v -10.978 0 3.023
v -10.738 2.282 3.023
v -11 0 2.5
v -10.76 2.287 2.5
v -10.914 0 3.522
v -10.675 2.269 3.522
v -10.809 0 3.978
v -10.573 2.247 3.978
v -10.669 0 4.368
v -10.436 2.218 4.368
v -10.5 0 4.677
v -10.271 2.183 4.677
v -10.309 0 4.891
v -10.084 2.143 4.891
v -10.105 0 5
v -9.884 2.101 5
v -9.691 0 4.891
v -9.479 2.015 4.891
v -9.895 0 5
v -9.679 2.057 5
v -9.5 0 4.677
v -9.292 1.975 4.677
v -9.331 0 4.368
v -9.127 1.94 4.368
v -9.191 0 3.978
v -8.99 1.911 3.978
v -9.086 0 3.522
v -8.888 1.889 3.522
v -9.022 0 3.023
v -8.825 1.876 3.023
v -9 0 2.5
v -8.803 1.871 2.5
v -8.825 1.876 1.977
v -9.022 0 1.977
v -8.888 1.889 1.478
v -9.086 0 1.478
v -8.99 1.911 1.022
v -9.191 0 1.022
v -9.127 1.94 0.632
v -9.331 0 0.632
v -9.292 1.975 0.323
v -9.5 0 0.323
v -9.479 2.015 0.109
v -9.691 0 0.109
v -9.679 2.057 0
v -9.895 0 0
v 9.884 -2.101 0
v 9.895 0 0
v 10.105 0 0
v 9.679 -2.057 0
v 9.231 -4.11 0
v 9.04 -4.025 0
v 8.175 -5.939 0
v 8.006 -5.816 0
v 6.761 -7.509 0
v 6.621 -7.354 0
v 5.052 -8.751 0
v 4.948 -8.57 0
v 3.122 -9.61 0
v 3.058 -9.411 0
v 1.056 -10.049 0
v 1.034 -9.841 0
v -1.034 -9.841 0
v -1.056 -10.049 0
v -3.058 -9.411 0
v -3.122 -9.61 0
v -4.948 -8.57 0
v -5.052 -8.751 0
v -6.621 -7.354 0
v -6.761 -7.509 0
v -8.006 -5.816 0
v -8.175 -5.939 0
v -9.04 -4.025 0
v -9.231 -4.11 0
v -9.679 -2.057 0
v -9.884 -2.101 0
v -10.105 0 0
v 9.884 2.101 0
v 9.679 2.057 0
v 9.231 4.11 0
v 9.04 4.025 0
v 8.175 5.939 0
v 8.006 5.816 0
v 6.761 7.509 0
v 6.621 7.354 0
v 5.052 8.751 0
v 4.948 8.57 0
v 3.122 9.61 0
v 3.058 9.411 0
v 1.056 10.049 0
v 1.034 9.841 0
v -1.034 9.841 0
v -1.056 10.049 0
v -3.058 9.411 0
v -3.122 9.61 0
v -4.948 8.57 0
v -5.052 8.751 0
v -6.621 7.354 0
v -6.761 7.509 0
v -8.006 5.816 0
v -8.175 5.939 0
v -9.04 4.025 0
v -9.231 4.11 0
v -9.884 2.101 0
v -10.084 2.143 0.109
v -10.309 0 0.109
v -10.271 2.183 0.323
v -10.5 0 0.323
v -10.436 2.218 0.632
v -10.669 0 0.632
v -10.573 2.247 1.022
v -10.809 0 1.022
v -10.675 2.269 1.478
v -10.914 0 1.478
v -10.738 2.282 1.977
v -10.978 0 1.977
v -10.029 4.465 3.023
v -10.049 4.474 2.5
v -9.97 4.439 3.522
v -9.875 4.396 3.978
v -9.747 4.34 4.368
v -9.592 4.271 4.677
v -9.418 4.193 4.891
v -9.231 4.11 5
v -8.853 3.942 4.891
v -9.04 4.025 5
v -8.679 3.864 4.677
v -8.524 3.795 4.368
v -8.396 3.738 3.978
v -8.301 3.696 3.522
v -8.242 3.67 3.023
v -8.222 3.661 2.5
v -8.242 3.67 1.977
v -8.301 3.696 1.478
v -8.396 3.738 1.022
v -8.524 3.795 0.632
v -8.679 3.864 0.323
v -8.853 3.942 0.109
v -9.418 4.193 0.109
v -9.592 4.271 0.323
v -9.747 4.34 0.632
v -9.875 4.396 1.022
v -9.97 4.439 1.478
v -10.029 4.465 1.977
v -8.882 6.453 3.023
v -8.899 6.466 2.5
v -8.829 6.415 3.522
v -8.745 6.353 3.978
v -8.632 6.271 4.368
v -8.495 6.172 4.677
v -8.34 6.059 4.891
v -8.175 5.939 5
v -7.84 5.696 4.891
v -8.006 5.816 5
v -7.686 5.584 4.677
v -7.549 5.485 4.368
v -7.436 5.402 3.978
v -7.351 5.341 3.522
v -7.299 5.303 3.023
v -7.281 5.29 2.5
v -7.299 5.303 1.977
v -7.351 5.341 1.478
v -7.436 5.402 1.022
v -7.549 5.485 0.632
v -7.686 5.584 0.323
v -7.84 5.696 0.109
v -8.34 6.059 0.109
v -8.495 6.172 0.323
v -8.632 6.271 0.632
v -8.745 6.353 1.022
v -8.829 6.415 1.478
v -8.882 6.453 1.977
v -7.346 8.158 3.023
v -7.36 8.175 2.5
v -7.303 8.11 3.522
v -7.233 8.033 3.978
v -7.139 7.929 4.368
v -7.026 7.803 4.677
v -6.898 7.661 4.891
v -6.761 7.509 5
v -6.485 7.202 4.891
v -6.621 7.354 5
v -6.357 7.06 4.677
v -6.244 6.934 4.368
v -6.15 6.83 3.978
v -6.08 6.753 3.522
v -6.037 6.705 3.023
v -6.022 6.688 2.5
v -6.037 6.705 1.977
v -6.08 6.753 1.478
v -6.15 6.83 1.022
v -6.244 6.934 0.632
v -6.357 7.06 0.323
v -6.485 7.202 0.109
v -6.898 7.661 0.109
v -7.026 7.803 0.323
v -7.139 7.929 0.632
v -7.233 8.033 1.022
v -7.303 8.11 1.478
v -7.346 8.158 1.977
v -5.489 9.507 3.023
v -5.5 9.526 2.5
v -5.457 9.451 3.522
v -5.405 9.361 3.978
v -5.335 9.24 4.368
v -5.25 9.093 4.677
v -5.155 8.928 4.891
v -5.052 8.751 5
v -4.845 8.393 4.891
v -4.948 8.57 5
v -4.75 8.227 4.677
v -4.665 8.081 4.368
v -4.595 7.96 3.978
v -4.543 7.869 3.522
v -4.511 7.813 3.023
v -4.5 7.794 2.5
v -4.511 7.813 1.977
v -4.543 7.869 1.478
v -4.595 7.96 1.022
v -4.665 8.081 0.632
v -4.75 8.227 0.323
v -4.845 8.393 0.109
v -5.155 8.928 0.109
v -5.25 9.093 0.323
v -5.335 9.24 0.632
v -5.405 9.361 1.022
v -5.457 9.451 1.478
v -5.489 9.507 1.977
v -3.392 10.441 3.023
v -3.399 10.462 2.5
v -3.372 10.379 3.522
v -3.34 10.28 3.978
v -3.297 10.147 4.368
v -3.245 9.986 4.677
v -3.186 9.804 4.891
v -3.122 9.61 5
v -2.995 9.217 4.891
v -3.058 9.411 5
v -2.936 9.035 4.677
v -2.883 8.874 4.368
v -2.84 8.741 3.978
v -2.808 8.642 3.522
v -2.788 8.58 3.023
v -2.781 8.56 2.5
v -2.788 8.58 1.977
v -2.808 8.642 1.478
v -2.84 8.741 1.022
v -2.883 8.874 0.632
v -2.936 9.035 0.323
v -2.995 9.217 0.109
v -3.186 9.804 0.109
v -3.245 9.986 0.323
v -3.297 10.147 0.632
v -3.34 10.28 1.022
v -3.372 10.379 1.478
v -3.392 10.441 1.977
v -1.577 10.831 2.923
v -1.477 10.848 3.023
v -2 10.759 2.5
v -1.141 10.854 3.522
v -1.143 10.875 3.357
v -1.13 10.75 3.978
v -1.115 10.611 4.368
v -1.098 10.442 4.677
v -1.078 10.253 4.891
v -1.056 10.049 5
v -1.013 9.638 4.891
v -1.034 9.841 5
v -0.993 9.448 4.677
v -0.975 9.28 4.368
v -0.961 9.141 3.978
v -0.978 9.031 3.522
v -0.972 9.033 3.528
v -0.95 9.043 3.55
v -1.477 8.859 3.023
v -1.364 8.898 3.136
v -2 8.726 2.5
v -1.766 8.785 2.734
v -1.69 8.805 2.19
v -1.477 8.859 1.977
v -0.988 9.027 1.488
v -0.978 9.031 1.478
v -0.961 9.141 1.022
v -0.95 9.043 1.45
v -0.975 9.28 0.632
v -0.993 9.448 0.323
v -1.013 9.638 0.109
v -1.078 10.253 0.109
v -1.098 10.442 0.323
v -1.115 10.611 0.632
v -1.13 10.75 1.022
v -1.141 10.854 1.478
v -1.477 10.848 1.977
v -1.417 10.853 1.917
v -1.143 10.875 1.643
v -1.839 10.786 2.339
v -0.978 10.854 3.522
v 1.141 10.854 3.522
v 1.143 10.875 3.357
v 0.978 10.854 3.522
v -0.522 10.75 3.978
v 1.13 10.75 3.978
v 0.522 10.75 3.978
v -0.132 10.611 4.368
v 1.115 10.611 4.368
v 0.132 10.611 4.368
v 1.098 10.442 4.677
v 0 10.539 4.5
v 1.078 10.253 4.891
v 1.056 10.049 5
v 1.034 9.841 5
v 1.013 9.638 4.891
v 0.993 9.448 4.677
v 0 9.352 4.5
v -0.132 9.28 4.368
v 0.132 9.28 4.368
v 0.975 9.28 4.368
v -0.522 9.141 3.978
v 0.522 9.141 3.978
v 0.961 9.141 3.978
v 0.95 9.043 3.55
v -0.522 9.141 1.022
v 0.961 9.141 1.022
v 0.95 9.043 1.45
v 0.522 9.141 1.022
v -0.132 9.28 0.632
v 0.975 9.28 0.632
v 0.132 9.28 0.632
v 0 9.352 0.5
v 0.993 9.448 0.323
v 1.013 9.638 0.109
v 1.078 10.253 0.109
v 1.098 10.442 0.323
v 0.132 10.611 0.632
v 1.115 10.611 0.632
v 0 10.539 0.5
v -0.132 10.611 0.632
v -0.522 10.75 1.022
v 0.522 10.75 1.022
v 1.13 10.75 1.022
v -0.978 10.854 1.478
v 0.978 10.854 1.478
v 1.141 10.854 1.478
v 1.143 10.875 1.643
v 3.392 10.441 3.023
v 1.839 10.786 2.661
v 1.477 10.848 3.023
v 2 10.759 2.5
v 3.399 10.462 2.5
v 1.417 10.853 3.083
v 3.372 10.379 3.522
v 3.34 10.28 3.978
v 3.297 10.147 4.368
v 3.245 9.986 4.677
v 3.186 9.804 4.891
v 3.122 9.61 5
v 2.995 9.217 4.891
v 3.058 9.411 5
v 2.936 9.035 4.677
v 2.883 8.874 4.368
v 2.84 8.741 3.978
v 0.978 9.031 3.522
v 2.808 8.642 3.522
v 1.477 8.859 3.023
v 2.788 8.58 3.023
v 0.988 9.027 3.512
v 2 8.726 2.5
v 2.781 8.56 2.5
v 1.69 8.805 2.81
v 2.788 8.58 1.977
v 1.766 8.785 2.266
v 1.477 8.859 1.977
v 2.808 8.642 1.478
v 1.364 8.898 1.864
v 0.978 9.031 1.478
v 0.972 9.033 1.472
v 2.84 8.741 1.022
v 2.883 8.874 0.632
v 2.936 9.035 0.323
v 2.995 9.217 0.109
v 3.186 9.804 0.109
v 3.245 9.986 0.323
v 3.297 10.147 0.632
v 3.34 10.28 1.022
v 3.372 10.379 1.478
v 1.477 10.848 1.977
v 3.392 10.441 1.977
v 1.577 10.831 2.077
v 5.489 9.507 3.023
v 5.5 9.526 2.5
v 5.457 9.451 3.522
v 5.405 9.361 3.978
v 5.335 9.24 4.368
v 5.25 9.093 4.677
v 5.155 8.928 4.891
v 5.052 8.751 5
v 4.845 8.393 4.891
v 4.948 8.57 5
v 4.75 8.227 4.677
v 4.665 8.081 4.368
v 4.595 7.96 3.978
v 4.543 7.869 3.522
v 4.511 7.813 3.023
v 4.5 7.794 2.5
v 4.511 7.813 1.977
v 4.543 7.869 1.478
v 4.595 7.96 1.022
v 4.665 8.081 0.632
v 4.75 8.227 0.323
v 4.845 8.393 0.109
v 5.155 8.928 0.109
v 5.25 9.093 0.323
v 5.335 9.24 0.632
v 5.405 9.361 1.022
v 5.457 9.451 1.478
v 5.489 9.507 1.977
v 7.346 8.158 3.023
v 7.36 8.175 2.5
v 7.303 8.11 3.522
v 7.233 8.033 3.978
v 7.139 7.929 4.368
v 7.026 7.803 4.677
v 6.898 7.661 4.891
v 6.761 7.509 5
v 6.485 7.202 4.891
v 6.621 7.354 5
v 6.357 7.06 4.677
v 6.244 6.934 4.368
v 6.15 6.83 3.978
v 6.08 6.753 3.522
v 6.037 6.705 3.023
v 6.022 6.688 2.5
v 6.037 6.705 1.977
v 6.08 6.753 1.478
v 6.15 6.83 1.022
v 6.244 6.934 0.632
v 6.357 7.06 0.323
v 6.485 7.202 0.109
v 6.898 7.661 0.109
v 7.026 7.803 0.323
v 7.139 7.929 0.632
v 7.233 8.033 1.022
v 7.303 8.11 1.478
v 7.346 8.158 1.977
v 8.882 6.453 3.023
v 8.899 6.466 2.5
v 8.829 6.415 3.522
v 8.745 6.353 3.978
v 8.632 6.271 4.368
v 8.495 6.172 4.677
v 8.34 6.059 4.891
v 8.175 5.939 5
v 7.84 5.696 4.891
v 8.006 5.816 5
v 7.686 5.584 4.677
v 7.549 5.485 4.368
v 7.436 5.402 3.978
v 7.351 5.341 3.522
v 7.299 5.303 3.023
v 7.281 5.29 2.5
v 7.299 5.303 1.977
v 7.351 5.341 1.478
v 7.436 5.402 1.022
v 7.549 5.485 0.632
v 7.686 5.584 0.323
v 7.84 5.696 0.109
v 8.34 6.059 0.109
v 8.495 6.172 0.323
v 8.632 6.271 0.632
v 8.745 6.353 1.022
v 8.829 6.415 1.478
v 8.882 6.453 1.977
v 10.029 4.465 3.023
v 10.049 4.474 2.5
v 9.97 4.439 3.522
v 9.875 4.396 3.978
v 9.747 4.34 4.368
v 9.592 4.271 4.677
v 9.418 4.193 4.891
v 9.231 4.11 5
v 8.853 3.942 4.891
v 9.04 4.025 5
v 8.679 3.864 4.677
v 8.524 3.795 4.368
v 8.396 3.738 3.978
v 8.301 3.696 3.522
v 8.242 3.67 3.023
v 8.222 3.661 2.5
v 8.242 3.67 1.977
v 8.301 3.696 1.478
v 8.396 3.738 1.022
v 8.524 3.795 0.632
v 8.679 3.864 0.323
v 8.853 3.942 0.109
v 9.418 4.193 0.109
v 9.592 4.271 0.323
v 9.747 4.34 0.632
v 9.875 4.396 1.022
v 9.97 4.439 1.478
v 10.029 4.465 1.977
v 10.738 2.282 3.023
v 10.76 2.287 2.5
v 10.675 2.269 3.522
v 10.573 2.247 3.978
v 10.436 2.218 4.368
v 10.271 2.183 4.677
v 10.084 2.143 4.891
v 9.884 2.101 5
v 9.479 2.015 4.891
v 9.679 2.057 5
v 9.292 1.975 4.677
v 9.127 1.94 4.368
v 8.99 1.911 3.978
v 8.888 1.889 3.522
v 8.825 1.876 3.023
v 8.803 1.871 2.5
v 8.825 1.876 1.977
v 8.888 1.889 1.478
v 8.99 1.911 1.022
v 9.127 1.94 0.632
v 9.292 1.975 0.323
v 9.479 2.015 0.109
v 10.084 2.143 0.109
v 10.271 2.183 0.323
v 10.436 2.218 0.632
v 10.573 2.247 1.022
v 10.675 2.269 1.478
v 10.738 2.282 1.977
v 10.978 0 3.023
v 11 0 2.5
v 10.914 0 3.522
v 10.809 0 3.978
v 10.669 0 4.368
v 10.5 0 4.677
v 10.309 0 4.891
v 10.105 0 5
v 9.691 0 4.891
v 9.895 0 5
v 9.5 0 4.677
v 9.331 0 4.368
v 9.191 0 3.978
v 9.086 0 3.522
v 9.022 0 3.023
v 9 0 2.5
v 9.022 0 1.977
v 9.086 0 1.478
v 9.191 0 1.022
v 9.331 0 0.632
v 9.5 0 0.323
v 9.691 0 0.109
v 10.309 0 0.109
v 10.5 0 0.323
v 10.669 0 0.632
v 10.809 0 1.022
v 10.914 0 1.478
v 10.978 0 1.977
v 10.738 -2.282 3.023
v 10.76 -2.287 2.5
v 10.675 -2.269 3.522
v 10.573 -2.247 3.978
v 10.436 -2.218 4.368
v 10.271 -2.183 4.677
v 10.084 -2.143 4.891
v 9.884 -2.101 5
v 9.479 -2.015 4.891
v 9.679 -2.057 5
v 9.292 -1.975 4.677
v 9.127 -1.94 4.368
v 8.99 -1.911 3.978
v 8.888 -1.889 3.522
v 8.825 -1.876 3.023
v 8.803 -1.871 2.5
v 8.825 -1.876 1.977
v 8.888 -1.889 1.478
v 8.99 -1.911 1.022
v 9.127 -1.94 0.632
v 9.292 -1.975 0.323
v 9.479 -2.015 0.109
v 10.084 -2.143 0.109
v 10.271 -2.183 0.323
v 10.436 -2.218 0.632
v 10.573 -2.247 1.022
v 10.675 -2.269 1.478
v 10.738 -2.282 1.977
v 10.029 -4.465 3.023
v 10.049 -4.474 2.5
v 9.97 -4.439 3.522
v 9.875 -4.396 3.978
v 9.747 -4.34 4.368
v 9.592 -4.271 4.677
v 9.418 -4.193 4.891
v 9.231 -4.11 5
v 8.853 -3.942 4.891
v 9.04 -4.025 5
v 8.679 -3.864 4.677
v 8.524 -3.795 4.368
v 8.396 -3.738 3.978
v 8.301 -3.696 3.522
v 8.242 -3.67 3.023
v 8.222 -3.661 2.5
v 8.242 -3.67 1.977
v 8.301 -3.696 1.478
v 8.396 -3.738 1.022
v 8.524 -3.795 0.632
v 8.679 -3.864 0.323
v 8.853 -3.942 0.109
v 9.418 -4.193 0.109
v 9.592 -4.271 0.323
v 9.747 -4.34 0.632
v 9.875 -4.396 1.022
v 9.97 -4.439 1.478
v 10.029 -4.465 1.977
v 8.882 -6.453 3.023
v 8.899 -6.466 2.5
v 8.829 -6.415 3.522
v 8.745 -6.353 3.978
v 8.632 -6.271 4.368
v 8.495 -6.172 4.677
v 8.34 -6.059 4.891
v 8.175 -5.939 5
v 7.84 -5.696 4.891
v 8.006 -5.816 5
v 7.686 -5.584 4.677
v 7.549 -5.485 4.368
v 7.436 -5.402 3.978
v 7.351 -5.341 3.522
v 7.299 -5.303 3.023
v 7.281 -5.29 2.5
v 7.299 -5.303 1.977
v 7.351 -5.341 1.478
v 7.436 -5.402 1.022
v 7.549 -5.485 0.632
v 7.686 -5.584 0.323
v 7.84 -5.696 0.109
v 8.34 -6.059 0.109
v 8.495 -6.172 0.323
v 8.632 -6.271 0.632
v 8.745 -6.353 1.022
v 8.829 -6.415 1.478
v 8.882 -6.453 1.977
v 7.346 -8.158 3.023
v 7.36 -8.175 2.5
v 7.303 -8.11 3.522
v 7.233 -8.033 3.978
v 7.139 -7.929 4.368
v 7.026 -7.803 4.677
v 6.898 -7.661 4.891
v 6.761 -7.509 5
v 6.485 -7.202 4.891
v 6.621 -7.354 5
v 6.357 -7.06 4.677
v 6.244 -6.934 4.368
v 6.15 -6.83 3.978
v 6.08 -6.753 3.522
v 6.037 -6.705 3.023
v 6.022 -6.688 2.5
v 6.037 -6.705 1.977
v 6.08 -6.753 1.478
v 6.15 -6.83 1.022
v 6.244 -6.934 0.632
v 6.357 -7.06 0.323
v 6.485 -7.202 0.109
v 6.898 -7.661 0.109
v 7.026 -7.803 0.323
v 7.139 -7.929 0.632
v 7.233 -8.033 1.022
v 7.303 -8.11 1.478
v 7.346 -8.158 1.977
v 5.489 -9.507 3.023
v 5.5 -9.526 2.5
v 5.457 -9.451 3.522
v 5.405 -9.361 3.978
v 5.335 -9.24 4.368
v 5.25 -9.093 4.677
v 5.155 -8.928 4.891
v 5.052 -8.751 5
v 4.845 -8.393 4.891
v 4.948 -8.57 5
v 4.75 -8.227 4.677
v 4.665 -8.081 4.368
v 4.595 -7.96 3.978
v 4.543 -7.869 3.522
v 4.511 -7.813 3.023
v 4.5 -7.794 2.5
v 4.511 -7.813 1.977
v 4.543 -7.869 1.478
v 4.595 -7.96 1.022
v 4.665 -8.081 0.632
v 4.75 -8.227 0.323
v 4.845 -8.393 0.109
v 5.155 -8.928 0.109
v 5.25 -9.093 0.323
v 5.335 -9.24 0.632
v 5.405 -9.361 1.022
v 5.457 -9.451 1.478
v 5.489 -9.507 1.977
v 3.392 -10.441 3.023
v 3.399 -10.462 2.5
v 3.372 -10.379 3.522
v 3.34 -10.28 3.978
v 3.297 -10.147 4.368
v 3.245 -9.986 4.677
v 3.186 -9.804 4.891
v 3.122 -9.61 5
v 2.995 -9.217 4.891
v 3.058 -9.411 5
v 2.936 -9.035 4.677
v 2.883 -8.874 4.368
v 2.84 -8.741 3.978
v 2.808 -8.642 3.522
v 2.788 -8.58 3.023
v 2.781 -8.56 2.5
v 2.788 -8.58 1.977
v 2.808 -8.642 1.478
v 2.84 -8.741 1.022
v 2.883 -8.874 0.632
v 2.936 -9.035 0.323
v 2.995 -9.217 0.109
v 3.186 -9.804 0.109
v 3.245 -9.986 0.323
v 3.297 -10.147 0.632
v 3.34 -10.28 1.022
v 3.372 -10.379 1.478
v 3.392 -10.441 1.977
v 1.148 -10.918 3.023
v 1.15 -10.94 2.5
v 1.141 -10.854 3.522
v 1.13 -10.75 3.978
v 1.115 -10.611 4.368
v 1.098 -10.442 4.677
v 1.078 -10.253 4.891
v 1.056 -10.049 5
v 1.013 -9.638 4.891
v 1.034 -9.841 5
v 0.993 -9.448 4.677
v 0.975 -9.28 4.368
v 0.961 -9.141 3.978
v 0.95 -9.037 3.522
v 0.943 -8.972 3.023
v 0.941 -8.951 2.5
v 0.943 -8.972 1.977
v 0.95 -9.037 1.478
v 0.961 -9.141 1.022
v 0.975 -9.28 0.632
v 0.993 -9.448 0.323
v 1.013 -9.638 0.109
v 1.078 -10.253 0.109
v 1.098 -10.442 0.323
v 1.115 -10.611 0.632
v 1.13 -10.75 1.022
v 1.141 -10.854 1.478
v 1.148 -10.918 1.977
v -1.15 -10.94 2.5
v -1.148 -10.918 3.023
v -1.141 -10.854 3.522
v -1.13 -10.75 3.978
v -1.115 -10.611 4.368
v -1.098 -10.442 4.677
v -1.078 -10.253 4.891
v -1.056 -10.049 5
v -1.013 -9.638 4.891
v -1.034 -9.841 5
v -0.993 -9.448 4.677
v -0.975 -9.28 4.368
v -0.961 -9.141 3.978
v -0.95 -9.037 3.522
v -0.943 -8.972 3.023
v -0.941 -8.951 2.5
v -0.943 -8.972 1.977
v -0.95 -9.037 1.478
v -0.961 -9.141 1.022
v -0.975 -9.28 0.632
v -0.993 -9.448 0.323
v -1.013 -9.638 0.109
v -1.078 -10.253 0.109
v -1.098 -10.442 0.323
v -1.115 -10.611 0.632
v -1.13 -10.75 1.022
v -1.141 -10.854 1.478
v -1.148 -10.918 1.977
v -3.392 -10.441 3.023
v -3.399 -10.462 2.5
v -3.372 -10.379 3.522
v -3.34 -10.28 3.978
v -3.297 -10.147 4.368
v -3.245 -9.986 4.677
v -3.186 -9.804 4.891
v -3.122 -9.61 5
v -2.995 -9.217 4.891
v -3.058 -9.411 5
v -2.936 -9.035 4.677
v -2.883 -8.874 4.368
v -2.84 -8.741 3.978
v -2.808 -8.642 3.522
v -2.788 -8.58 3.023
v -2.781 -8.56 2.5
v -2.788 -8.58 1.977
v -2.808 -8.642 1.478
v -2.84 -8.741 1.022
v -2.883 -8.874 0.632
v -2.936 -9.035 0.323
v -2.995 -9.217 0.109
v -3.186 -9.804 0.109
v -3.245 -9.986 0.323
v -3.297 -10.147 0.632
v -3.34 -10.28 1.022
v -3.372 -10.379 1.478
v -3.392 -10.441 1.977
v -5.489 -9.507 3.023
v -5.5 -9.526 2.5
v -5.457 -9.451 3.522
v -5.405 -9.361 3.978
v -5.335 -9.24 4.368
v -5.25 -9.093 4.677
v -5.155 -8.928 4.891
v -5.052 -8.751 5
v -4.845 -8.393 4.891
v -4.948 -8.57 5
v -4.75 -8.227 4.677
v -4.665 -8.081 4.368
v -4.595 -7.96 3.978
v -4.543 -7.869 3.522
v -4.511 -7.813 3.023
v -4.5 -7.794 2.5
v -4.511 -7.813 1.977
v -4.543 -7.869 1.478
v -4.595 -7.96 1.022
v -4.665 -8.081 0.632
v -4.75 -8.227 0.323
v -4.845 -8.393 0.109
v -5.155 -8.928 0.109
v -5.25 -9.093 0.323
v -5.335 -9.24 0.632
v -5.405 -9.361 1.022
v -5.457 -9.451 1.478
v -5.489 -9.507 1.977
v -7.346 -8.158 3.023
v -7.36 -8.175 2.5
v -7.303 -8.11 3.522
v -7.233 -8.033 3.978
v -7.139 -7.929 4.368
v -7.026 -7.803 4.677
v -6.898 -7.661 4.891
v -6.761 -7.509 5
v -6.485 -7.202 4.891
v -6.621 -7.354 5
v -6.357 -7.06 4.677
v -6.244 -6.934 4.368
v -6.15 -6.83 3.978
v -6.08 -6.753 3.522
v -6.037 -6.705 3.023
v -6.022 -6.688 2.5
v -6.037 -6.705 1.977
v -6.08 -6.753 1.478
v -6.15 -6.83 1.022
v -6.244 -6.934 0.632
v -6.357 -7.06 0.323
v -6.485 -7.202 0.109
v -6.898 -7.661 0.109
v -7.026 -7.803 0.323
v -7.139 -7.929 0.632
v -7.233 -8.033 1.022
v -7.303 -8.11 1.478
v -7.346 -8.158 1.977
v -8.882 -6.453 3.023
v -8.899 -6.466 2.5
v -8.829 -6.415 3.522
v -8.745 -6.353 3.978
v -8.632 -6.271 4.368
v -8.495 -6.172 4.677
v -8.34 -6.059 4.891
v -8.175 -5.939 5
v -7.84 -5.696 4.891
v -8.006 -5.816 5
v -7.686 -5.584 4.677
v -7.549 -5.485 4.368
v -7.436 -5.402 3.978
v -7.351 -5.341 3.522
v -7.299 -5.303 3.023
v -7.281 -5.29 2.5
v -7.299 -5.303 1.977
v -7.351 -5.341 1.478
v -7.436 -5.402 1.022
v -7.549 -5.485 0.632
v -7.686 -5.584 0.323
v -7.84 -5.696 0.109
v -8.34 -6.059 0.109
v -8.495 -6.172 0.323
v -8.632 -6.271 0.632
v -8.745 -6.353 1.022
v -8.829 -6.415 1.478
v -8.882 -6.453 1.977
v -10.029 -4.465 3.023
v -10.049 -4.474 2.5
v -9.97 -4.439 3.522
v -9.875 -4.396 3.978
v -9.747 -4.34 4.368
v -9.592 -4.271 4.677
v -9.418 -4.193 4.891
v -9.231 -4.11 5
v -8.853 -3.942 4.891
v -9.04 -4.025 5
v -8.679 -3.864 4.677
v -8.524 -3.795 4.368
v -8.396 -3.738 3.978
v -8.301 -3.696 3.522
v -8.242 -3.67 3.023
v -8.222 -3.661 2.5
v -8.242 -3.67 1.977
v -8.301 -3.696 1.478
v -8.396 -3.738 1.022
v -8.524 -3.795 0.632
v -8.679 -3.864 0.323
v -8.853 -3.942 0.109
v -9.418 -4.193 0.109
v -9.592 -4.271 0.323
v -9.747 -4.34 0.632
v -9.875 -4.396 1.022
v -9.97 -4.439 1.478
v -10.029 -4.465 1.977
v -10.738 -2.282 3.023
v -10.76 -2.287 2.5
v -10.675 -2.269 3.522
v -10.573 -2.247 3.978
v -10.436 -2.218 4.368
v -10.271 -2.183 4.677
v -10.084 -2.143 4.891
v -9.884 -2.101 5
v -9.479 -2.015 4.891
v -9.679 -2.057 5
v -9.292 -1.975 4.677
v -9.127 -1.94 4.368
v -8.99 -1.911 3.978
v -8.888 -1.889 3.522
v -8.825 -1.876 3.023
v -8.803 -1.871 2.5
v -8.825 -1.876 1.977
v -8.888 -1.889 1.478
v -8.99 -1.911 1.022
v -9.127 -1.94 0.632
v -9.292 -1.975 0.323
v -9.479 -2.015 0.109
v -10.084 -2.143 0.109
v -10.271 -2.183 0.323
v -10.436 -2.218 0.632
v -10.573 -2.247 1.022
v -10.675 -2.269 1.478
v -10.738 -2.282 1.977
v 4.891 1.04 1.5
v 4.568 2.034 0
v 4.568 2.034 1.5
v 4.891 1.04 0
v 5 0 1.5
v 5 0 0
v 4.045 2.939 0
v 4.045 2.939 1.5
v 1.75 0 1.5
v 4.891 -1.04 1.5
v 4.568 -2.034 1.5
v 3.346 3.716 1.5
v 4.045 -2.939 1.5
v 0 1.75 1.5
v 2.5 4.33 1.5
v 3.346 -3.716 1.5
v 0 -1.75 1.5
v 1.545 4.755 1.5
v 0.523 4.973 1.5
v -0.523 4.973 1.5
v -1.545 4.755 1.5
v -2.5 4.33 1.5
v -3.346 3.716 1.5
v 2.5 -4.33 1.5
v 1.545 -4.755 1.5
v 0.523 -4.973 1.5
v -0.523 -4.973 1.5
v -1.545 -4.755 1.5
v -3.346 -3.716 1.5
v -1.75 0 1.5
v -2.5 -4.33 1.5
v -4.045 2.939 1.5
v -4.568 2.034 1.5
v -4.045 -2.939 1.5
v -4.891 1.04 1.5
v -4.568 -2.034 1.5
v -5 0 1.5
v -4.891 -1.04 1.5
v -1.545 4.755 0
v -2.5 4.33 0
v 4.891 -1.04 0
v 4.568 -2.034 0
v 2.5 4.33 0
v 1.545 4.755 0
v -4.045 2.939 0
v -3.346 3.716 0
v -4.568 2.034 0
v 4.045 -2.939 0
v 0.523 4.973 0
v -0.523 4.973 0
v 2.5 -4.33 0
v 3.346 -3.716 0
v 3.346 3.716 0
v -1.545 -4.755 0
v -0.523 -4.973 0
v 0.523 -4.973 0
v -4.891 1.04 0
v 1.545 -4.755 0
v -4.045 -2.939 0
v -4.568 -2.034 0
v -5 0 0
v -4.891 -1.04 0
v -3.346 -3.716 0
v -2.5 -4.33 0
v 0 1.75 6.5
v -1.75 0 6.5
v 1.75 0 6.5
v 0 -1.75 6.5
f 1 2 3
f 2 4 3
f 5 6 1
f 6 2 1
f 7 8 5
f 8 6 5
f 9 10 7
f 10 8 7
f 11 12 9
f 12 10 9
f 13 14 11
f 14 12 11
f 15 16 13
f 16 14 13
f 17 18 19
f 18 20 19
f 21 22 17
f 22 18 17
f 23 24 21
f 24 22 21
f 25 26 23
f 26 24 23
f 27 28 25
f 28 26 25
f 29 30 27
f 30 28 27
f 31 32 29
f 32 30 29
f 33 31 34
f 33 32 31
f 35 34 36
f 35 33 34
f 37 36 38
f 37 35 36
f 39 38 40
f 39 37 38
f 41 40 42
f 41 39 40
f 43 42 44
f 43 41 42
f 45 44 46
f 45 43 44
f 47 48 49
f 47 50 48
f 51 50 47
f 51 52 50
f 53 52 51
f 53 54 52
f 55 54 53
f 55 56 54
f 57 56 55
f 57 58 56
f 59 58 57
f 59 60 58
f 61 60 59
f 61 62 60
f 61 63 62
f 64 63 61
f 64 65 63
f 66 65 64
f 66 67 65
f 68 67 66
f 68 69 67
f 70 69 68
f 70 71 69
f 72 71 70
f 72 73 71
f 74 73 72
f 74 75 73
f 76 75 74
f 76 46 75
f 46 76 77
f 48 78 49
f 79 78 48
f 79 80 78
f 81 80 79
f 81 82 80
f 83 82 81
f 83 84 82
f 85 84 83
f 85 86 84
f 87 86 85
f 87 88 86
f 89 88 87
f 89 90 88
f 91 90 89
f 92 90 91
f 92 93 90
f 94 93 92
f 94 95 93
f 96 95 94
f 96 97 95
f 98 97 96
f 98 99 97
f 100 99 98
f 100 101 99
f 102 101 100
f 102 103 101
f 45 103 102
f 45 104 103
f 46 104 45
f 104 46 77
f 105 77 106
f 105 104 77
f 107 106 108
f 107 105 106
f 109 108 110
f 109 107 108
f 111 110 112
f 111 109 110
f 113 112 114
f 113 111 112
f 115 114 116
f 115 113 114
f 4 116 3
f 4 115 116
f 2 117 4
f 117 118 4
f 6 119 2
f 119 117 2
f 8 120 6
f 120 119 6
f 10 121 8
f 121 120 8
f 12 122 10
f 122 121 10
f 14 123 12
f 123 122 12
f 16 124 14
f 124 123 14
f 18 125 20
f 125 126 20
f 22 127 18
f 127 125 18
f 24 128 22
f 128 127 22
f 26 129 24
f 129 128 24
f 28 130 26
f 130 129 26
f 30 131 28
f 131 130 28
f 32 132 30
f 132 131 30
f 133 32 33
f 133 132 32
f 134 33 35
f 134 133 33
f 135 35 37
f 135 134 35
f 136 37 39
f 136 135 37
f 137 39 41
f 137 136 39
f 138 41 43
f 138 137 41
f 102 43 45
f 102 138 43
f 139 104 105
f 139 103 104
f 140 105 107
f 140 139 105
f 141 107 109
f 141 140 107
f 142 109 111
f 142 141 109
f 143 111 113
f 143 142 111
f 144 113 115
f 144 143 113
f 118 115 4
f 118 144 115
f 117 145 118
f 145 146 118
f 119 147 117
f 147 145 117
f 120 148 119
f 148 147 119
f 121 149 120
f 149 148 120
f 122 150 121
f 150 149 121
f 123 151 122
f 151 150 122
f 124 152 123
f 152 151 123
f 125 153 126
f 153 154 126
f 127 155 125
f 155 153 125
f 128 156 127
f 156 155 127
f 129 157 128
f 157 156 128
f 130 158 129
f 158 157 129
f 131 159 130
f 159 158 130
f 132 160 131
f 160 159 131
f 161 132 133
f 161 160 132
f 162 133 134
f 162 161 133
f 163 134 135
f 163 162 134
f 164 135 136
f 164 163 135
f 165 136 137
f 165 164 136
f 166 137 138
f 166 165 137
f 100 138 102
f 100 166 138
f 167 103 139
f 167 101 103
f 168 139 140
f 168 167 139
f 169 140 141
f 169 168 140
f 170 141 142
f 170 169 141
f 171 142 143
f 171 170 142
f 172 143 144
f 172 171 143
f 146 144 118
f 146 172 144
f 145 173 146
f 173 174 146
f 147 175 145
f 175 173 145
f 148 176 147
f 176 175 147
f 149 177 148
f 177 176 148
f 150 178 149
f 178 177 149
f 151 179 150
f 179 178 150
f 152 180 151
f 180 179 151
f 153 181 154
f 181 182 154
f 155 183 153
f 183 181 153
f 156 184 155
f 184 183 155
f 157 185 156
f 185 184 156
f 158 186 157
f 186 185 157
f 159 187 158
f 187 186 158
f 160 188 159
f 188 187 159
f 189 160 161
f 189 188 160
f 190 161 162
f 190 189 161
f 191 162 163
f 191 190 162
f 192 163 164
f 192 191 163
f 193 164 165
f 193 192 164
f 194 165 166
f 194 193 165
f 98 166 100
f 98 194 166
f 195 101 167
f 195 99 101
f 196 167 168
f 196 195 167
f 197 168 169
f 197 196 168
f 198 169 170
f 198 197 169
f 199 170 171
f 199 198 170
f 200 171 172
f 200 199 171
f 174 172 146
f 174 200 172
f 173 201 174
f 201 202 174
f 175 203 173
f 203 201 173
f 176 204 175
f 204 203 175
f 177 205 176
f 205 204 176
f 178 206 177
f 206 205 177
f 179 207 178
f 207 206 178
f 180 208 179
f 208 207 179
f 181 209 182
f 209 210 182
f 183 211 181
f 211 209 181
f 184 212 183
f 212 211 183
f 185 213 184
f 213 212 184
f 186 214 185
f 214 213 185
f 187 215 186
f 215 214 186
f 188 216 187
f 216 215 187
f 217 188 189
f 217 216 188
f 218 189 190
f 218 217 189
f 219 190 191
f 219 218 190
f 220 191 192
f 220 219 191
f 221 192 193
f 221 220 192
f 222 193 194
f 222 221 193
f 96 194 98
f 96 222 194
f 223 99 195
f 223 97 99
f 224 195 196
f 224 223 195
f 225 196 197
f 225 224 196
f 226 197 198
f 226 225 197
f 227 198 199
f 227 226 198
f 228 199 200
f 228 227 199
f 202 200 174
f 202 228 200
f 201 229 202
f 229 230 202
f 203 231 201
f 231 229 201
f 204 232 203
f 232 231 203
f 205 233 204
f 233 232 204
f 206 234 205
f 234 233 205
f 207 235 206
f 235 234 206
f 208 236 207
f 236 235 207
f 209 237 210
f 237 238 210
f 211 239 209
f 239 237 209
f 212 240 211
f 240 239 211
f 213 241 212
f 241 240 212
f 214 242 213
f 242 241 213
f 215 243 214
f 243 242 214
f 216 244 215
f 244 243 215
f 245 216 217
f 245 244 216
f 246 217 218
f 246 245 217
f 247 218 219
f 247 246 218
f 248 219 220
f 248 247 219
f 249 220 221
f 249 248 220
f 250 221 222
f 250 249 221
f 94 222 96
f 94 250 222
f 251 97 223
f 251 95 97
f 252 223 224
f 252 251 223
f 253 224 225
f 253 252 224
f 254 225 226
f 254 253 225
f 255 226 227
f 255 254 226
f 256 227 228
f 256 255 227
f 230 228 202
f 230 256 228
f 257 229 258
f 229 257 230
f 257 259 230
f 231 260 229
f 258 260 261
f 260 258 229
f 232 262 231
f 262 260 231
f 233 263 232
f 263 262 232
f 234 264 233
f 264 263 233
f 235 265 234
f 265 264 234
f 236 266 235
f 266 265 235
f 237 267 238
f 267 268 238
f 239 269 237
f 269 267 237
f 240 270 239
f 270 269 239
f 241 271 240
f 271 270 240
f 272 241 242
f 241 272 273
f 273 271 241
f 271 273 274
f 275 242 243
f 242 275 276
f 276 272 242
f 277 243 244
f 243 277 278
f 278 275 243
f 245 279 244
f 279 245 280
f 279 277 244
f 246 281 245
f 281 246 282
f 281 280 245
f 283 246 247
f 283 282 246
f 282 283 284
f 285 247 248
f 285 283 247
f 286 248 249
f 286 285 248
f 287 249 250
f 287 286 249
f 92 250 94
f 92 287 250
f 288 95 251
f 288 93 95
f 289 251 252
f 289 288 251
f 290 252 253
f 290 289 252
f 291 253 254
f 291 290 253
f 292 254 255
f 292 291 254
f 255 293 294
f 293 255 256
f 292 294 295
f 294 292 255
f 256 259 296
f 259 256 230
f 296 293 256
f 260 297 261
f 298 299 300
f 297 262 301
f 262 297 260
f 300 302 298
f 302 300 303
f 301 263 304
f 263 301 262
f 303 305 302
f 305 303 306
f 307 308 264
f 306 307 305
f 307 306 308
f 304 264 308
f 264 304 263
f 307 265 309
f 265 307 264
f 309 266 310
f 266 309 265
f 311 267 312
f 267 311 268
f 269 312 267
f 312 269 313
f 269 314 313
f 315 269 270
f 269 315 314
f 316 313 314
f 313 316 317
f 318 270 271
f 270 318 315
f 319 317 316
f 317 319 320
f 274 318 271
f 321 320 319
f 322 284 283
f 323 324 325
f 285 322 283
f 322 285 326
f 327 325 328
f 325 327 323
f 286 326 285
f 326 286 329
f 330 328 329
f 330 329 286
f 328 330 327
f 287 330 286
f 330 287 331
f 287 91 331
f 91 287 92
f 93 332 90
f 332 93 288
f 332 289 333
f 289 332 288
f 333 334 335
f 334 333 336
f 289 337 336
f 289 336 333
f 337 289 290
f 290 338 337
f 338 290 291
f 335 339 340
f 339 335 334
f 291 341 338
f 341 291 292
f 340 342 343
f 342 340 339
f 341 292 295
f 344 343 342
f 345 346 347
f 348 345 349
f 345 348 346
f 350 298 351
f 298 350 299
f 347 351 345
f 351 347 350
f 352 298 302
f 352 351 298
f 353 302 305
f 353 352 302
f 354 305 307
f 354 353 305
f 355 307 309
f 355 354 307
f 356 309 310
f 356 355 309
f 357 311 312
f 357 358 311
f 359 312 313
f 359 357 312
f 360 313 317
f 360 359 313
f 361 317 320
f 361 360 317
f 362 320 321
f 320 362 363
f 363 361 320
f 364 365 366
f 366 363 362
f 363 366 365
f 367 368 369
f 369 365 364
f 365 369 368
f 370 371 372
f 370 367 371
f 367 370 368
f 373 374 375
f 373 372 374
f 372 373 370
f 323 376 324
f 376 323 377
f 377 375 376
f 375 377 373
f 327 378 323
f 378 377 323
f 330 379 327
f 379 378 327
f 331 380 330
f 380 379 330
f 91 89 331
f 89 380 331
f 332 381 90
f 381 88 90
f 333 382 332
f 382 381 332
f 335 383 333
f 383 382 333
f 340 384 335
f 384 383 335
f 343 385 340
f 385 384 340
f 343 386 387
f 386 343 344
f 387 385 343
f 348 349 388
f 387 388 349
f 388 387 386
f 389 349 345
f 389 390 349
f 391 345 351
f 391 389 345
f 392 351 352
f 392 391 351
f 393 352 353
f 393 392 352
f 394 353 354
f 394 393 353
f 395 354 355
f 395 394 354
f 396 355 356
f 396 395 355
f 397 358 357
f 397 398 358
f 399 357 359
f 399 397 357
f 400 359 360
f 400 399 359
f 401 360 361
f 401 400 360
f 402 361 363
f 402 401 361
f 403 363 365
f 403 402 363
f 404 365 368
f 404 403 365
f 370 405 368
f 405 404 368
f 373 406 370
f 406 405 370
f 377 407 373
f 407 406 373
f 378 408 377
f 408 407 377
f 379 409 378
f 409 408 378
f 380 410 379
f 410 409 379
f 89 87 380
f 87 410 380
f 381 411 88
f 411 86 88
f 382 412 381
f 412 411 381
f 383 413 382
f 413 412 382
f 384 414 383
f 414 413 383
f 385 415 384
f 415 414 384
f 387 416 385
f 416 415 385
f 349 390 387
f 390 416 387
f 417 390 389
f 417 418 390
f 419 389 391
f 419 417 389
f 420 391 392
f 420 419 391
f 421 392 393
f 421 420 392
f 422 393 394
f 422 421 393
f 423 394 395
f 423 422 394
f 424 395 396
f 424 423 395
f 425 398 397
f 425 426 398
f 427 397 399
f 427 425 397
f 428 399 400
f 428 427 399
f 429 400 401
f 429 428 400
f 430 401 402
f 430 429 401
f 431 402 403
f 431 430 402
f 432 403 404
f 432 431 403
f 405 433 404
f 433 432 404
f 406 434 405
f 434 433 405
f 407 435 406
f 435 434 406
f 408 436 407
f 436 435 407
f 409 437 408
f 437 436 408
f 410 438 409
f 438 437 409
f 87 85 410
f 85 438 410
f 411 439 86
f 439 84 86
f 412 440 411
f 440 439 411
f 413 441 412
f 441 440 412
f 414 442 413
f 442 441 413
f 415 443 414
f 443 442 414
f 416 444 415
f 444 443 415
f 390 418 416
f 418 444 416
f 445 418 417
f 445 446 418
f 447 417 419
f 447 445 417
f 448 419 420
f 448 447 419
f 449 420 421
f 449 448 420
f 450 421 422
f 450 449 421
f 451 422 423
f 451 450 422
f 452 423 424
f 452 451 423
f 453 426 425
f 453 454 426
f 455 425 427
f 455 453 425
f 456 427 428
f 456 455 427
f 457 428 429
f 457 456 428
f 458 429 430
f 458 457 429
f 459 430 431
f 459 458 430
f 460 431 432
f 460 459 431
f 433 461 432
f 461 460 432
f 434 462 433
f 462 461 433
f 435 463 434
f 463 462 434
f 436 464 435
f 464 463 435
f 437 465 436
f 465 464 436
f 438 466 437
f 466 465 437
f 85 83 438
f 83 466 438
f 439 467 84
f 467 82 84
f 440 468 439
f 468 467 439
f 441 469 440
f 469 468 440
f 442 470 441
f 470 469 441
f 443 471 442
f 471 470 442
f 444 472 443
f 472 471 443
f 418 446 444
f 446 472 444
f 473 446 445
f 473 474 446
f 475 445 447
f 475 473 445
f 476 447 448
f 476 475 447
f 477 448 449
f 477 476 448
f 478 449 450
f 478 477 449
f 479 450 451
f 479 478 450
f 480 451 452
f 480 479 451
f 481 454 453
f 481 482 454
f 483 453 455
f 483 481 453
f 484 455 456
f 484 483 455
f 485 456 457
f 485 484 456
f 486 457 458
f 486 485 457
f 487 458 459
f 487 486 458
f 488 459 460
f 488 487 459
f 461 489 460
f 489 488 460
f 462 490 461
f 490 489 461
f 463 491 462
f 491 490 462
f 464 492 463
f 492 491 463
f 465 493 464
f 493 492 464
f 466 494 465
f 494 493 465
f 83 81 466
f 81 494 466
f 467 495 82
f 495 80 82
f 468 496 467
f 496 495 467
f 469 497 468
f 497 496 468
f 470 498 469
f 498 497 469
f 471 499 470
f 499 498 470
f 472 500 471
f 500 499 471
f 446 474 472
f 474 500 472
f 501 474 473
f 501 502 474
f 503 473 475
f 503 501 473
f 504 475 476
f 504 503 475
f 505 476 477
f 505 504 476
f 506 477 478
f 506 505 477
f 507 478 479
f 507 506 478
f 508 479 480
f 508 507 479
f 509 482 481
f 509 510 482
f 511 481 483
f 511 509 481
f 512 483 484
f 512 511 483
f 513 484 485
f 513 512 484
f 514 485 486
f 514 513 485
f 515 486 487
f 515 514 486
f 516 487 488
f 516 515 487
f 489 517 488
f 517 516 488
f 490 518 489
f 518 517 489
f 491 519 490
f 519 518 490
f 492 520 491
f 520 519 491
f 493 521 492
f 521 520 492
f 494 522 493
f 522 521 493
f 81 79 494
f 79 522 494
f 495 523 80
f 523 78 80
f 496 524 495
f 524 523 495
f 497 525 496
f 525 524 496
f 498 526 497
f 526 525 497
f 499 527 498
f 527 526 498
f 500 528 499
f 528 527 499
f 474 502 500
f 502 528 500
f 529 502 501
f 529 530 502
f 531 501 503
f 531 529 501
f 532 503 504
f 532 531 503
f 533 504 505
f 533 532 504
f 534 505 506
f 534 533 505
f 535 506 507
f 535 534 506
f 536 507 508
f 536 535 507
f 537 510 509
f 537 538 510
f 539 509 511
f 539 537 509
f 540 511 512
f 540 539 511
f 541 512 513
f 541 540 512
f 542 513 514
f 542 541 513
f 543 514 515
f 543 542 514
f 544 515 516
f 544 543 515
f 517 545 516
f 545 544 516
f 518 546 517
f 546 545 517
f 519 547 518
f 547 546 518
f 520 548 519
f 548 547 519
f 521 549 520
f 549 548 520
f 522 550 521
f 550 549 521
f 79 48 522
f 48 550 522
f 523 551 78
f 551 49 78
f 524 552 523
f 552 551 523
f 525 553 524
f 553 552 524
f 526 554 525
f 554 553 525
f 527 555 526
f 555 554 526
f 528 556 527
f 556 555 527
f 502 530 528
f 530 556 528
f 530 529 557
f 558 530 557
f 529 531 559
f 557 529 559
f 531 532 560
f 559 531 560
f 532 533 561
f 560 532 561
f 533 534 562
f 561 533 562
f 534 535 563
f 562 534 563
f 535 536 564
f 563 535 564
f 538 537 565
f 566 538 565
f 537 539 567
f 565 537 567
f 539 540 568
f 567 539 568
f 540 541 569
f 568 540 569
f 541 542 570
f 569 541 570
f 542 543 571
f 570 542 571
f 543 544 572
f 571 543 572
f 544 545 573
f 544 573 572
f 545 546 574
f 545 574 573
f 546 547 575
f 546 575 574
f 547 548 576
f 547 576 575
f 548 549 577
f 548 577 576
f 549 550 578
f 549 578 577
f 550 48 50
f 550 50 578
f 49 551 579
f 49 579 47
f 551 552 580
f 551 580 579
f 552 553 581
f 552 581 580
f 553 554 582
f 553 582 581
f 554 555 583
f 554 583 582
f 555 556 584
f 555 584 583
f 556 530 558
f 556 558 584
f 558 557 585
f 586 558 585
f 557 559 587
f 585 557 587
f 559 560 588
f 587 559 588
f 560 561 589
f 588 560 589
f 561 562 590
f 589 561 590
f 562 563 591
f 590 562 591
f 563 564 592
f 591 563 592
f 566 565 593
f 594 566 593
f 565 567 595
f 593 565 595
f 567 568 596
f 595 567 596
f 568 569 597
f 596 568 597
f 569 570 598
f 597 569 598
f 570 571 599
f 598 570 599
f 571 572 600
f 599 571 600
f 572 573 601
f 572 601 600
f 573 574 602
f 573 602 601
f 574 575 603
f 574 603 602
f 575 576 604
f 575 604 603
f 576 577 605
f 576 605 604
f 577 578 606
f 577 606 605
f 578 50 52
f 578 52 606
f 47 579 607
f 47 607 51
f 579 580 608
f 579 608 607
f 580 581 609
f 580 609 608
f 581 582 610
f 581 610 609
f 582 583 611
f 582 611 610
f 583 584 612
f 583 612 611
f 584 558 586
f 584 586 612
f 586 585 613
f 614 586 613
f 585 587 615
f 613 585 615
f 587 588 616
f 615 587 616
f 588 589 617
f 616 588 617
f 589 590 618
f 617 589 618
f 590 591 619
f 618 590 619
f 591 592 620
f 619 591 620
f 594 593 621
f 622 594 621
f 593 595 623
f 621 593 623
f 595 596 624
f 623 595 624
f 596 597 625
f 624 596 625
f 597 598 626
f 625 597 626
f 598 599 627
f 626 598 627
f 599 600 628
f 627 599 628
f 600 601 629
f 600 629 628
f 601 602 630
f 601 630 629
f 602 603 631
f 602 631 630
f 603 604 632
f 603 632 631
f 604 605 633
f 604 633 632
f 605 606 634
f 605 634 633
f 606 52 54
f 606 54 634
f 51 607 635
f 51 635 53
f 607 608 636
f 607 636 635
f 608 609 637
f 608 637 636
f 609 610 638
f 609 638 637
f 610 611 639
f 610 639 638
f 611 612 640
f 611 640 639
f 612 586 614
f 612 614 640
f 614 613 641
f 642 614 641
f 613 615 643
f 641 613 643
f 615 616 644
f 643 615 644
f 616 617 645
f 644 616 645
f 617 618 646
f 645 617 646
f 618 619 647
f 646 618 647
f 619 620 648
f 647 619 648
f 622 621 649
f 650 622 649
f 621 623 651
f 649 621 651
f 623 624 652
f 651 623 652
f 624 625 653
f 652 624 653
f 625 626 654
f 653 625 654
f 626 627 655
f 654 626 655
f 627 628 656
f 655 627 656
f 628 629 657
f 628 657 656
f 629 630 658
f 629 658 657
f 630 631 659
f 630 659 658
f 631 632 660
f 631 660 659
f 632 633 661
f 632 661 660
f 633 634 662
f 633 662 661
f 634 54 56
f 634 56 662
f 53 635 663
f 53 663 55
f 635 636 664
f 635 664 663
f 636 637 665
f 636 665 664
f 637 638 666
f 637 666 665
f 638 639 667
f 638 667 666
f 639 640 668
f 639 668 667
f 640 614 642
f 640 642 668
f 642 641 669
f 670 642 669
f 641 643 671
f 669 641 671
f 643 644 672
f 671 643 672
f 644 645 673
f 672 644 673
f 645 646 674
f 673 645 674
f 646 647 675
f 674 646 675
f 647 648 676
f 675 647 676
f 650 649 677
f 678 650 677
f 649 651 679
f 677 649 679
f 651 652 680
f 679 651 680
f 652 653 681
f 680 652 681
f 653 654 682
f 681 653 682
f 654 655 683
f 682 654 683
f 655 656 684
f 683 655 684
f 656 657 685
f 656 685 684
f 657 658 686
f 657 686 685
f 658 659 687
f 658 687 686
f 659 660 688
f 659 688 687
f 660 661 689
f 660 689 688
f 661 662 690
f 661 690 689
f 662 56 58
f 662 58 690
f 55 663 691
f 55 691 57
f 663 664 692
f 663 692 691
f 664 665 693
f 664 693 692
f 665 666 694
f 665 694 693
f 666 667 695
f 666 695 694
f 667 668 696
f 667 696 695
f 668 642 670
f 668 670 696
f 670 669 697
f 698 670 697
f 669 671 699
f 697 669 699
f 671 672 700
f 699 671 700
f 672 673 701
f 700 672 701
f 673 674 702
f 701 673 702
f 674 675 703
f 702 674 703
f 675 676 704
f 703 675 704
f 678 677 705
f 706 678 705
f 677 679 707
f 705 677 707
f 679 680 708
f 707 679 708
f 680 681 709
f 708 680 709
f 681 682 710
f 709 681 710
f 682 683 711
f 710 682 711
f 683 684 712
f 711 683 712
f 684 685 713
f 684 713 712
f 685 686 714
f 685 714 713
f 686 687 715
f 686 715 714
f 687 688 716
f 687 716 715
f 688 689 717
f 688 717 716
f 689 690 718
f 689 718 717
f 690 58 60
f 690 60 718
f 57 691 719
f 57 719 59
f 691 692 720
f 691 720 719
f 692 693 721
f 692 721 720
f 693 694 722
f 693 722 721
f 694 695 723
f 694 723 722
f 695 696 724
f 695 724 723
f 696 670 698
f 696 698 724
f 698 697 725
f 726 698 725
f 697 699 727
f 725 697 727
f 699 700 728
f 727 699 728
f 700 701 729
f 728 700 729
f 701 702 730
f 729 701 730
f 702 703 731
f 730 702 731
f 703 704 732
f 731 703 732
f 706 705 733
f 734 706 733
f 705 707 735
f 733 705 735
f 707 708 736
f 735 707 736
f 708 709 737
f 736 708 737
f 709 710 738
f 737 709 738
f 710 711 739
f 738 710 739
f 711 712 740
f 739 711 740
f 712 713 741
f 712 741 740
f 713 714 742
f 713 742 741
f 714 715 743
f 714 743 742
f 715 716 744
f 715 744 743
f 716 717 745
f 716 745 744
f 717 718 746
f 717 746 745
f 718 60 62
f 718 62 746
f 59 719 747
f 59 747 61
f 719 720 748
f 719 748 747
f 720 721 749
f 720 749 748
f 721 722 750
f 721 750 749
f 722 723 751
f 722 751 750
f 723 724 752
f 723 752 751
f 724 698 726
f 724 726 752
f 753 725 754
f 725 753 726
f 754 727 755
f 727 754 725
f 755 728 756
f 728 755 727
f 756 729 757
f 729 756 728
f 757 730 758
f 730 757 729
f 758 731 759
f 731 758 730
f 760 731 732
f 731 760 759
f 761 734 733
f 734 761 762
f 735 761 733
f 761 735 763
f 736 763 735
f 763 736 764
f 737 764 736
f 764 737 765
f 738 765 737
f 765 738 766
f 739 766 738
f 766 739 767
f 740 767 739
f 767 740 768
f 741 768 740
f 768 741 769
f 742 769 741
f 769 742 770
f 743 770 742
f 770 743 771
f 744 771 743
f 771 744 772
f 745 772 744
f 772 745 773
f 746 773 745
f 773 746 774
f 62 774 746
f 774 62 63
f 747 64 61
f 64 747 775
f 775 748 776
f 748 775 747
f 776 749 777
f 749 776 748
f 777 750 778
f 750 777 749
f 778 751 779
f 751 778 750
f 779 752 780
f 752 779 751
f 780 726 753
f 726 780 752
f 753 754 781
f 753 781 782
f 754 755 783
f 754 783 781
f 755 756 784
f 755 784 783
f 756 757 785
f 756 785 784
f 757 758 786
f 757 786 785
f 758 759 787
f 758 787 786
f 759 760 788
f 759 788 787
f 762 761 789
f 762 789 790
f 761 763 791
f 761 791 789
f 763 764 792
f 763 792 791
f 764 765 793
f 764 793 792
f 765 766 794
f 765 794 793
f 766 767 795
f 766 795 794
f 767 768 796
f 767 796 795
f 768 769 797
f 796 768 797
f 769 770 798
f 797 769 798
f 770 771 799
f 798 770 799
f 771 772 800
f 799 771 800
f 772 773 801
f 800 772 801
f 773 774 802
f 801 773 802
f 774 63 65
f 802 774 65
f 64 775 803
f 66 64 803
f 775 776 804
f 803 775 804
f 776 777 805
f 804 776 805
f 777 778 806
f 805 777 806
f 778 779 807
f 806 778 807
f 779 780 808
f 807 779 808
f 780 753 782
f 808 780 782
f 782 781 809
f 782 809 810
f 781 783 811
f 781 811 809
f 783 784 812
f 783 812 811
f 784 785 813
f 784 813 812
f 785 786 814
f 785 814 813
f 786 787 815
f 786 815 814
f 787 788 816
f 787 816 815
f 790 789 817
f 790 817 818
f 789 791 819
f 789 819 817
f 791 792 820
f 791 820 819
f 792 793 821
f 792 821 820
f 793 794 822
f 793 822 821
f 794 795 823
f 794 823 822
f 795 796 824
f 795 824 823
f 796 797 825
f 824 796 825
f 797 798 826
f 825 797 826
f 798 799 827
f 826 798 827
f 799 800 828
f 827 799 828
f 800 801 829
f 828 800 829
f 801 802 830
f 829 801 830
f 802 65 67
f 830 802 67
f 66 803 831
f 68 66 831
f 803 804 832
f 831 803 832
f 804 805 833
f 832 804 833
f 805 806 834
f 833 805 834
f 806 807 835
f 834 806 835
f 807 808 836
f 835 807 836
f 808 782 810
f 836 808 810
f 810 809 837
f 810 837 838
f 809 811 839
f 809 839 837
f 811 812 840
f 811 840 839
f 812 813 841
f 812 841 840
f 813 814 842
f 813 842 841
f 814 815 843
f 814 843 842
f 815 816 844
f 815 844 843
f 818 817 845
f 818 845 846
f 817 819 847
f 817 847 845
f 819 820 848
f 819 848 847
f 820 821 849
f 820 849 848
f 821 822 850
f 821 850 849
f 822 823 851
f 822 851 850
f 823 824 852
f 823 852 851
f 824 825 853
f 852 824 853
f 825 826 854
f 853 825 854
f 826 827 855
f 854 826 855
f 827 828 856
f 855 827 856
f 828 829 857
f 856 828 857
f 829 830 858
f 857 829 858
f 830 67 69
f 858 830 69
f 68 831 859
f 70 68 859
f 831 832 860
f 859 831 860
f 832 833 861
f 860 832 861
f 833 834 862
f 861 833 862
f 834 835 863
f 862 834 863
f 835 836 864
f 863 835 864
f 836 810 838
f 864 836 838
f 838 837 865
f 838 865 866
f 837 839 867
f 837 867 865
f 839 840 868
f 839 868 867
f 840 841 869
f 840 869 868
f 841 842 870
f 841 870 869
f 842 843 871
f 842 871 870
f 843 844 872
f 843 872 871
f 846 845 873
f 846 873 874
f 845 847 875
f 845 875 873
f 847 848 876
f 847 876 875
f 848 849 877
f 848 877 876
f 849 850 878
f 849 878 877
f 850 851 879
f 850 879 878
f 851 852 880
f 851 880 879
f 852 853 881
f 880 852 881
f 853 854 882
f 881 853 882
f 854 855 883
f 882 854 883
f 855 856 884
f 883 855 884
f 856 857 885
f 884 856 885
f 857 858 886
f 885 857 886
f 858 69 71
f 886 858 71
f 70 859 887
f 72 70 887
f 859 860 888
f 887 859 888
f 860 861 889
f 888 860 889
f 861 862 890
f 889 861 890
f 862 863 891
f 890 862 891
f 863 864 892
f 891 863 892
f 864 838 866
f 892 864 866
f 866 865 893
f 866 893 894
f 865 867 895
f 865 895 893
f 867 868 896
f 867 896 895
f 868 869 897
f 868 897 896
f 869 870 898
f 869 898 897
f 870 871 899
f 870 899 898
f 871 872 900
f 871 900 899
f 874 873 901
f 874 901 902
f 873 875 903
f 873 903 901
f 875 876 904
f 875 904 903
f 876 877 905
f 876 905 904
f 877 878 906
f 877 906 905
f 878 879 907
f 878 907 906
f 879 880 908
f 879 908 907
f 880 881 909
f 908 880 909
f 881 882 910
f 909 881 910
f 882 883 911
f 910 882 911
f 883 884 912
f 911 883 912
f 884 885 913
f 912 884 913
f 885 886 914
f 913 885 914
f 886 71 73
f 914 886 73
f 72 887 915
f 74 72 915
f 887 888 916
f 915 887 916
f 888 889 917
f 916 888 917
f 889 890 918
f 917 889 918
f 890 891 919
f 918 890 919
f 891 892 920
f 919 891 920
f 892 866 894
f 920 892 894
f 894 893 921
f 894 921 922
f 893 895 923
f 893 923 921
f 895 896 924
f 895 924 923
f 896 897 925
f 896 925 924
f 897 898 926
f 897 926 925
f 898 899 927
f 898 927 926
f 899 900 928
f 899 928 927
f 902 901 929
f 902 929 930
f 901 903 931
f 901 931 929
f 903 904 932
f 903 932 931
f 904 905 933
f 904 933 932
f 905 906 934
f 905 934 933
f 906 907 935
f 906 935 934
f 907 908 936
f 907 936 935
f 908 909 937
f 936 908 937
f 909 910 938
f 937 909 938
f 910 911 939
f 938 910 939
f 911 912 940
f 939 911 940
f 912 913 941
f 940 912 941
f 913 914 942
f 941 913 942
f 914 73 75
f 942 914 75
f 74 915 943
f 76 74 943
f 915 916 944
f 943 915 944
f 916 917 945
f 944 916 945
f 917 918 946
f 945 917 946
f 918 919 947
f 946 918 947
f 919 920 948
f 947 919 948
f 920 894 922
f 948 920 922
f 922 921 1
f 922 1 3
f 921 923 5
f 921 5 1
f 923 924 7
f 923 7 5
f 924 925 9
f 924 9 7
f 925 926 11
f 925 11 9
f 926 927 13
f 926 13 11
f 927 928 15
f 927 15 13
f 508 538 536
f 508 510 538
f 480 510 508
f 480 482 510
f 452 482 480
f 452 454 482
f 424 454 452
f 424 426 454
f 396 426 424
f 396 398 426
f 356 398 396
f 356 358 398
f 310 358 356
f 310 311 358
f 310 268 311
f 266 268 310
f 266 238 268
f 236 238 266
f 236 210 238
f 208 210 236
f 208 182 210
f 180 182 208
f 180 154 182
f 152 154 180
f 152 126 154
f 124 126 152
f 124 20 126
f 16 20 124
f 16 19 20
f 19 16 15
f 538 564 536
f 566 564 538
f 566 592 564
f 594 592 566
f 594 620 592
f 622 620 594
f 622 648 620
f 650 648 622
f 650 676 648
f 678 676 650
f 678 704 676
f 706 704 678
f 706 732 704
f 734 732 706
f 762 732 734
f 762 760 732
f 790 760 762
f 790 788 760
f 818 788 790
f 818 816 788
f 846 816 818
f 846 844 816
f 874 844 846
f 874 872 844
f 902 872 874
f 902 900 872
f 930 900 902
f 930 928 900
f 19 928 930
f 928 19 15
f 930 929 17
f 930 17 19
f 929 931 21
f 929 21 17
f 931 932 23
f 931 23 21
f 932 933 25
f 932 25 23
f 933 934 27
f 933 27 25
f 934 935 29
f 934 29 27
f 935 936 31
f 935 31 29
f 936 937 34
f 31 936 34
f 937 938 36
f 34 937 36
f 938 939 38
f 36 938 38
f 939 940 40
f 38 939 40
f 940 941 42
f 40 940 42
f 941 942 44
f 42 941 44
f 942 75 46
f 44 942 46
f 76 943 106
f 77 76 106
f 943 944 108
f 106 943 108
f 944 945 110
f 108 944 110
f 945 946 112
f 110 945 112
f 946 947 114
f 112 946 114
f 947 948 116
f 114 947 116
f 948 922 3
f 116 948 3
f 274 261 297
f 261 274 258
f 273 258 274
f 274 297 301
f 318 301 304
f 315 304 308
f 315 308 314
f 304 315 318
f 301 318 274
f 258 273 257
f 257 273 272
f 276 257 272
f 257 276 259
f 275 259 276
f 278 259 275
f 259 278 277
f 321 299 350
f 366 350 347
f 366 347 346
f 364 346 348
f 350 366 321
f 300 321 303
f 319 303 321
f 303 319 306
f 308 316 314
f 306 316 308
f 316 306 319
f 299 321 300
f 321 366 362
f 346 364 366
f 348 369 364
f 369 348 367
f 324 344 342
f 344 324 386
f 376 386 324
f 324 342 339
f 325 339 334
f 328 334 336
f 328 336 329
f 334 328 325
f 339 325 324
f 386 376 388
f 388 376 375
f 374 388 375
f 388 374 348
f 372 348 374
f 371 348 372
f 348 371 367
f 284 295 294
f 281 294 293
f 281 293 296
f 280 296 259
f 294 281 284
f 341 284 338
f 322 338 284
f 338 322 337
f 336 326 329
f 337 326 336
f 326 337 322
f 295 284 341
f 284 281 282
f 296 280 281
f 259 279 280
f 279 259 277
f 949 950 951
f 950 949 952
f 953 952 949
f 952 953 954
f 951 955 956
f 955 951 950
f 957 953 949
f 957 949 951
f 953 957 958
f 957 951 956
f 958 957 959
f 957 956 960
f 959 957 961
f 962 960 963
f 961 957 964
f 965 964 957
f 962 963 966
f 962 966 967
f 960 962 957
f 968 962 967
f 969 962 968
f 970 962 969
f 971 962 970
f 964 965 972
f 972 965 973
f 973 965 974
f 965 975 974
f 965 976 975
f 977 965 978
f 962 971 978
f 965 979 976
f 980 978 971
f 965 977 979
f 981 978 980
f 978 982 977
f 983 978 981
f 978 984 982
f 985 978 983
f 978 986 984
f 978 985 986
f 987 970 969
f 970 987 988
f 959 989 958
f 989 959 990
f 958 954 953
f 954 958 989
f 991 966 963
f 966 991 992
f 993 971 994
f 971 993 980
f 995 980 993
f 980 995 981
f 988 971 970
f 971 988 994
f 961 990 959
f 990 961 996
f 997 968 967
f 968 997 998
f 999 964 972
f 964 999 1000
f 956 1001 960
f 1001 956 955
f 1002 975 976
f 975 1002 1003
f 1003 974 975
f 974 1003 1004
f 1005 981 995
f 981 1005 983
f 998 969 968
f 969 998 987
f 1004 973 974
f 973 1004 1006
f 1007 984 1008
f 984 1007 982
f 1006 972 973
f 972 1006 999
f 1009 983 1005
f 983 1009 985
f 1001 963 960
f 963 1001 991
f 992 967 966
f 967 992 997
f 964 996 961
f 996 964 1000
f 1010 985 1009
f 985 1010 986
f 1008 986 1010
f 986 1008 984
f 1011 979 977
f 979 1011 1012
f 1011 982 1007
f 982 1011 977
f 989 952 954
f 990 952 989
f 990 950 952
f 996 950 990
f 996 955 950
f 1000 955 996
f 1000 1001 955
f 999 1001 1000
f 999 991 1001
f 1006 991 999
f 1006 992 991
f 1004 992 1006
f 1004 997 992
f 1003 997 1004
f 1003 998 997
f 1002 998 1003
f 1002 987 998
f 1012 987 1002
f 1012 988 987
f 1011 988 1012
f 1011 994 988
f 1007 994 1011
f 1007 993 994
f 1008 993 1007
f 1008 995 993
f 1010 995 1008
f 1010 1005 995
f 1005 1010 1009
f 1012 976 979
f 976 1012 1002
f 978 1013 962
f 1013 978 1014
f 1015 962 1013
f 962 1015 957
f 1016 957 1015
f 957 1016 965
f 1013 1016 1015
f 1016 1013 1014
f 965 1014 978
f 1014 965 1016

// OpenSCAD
//////////////////////////////////////////////////////////////////////////////Ring//////////////////////
/*//////////////////////////////////////////////////







*/
phi = 1.618; //do not change

pi = 3.141; //do not change

include <write.scad>

t=2;

///////////////////////////////////////////////////////////////////////////////parameters///////////////////////////////////////////////////////////////////

ring = 1;

		$fn = 30;
		
		inner_diameter = 20;
		
		ring_size = [2,5];
		
		pin_height = 5; //do not change
		
		pin_diameter = 3.5; //do not change

pendant = 0;

		clasp_width = 2;

		clasp_loop_size = 2;

		clasp_loop_thickness = 1;


diamond = 0;
		
		diamond_height_top = 1.5;
		
		diamond_height_bottom = 3;
		
		diamond_diameter_top = 3.5;
		
		diamond_diameter_middle = 5;
		
		diamond_diameter_bottom = 2;
		
		little_diamond_size = 1;
		
		facets = 12;

		base_plate_thickness = 2;

name_plate = 1;

		name_plate_diameter = 10; //15 max
	
		word = "Pat"; //5 letters max
		
		plate_thickness = 1.5;



spiral = 0;
		
		density = 50;

		width = .5;

		angle = 45;
		
//////////////////////////////////////////////////////////////////////////////renders///////////////////////////////////////////////////////////////////////

rendered();






//////////////////////////////////////////////////////////////////////////////modules///////////////////////////////////////////////////////////////////////

module rendered(){
	if(ring) ring_base();
	if(pendant) pendant_base();
}

module pendant_base(){
	if(diamond) diamondMod();
	if(name_plate) name_plateMod();
}

module clasp(){
	translate([-clasp_width/2,0,0])
		rotate([0,90,0])
			difference(){
				cylinder(clasp_width,
				r=clasp_loop_size+clasp_loop_thickness);
				translate([0,0,-.5])
					cylinder(clasp_width+1,r=clasp_loop_size);
				if(name_plate){
					translate([0,-clasp_loop_size-clasp_loop_thickness,-.5])
						cube([(clasp_loop_size+clasp_loop_thickness),
						(clasp_loop_size+clasp_loop_thickness)*2,
						clasp_width+1]);
				}
			}
}


module ring_base(){
	translate([0,0,ring_size[1]/2])
		difference(){
			rotate_extrude()
				translate([inner_diameter/2,0,0])
					resize(ring_size)
						circle(1);
			translate([0,(inner_diameter/2)+ring_size[0],0])
				rotate([90,0,0])
					cylinder(pin_height,r=pin_diameter/2+.25, $fn=4);
			if(spiral)rotate([90,0,0]) spiralMod();
		}
	{
		if(diamond)diamondMod();
		if(name_plate) name_plateMod();
	}
}

module diamondMod(){
	union(){
		cylinder(diamond_height_top,
					diamond_diameter_top,
					diamond_diameter_middle,
					$fn=facets);
		translate([0,0,diamond_height_top])
			cylinder(diamond_height_bottom,
						diamond_diameter_middle,
						diamond_diameter_bottom,
						$fn=facets);
			if(ring){
				translate([0,0,diamond_height_bottom+diamond_height_top])
					cylinder(pin_height,r=pin_diameter/2, $fn=4);
			}
			if(pendant){
				translate([0,0,diamond_height_bottom+diamond_height_top])	
					clasp();
			}
	}
}

module name_plateMod(){
	difference(){
		cylinder(plate_thickness,r=name_plate_diameter/2);
		rotate([0,180,0])
			write(word,center=true);
	}
	if(ring){
		translate([0,0,plate_thickness])
			cylinder(pin_height,r=pin_diameter/2,$fn=4);
	}
	if(pendant){
		translate([0,name_plate_diameter/2-(clasp_loop_size+clasp_loop_thickness)-.25,plate_thickness])
			clasp();
	}
}

module spiralMod(){
	difference(){
		for(r = [0:360/density:360]){
			rotate([0,r,0])
				translate([inner_diameter/2+ring_size[0]/2,0,0])
					rotate([angle,0,0])
						cube([ring_size[0],ring_size[1],width],center=true);
		}	
		translate([0,0,-inner_diameter/2-ring_size[0]])
			cube([6,5,5],center=true);
	}
}
